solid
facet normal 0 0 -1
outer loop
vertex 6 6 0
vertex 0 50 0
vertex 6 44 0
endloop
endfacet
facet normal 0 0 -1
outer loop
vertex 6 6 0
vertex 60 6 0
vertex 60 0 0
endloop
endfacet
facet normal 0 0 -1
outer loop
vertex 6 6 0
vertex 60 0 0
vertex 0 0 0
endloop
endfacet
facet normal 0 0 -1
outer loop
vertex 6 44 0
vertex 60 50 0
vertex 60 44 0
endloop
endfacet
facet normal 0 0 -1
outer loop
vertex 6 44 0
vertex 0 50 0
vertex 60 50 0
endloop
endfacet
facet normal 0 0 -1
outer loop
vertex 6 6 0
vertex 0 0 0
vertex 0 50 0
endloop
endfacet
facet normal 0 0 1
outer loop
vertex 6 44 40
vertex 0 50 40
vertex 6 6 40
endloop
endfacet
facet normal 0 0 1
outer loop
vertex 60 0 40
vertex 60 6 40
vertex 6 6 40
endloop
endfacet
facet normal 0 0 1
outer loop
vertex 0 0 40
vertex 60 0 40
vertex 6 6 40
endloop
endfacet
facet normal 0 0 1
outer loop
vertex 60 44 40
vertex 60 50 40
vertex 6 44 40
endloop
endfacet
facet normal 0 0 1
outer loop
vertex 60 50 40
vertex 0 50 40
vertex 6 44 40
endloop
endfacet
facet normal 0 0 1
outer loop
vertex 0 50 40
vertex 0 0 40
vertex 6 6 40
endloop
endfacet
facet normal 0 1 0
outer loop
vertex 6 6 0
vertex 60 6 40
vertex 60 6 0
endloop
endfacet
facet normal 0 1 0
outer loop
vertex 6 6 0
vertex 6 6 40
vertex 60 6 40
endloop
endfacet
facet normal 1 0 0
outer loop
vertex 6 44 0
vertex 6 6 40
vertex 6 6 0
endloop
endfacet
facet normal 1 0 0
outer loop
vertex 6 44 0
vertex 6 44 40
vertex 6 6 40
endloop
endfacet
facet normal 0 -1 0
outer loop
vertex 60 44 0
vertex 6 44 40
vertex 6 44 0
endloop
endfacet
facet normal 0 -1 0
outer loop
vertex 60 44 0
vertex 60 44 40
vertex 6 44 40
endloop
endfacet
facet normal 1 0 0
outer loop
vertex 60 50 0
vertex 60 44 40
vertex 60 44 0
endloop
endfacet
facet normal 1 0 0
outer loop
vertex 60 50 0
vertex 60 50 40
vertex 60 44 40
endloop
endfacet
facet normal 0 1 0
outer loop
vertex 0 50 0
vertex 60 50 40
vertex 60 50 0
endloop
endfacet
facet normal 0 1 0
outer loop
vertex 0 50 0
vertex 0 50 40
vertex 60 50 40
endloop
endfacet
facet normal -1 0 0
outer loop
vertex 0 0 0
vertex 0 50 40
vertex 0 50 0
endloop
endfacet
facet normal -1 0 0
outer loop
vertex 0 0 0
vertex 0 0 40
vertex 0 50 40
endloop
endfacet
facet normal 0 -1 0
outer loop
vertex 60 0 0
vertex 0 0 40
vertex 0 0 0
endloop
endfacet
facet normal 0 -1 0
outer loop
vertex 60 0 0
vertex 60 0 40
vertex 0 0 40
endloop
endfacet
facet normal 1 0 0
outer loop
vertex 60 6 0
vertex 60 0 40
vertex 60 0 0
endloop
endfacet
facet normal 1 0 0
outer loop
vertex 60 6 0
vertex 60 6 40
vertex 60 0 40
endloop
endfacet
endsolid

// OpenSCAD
$fn = 32;

// ----------------------------------------------------------------------
// Structural section: channel 60 x 50 mm
// ----------------------------------------------------------------------

// --- parameters (mm) ---
sec_w = 60;               // channel width, X
sec_h = 50;               // channel height, Y
flange_t = 6;             // flange thickness
web_t = 6;                // web thickness
plate_t = 40;             // cut length, Z (extrusion height)

profile = [[0, 0], [60, 0], [60, 6], [6, 6], [6, 44], [60, 44], [60, 50], [0, 50]];  // primary outline, 8 points, counter clockwise

// --- the one profile operation ---
linear_extrude(height = plate_t) polygon(points = profile);
